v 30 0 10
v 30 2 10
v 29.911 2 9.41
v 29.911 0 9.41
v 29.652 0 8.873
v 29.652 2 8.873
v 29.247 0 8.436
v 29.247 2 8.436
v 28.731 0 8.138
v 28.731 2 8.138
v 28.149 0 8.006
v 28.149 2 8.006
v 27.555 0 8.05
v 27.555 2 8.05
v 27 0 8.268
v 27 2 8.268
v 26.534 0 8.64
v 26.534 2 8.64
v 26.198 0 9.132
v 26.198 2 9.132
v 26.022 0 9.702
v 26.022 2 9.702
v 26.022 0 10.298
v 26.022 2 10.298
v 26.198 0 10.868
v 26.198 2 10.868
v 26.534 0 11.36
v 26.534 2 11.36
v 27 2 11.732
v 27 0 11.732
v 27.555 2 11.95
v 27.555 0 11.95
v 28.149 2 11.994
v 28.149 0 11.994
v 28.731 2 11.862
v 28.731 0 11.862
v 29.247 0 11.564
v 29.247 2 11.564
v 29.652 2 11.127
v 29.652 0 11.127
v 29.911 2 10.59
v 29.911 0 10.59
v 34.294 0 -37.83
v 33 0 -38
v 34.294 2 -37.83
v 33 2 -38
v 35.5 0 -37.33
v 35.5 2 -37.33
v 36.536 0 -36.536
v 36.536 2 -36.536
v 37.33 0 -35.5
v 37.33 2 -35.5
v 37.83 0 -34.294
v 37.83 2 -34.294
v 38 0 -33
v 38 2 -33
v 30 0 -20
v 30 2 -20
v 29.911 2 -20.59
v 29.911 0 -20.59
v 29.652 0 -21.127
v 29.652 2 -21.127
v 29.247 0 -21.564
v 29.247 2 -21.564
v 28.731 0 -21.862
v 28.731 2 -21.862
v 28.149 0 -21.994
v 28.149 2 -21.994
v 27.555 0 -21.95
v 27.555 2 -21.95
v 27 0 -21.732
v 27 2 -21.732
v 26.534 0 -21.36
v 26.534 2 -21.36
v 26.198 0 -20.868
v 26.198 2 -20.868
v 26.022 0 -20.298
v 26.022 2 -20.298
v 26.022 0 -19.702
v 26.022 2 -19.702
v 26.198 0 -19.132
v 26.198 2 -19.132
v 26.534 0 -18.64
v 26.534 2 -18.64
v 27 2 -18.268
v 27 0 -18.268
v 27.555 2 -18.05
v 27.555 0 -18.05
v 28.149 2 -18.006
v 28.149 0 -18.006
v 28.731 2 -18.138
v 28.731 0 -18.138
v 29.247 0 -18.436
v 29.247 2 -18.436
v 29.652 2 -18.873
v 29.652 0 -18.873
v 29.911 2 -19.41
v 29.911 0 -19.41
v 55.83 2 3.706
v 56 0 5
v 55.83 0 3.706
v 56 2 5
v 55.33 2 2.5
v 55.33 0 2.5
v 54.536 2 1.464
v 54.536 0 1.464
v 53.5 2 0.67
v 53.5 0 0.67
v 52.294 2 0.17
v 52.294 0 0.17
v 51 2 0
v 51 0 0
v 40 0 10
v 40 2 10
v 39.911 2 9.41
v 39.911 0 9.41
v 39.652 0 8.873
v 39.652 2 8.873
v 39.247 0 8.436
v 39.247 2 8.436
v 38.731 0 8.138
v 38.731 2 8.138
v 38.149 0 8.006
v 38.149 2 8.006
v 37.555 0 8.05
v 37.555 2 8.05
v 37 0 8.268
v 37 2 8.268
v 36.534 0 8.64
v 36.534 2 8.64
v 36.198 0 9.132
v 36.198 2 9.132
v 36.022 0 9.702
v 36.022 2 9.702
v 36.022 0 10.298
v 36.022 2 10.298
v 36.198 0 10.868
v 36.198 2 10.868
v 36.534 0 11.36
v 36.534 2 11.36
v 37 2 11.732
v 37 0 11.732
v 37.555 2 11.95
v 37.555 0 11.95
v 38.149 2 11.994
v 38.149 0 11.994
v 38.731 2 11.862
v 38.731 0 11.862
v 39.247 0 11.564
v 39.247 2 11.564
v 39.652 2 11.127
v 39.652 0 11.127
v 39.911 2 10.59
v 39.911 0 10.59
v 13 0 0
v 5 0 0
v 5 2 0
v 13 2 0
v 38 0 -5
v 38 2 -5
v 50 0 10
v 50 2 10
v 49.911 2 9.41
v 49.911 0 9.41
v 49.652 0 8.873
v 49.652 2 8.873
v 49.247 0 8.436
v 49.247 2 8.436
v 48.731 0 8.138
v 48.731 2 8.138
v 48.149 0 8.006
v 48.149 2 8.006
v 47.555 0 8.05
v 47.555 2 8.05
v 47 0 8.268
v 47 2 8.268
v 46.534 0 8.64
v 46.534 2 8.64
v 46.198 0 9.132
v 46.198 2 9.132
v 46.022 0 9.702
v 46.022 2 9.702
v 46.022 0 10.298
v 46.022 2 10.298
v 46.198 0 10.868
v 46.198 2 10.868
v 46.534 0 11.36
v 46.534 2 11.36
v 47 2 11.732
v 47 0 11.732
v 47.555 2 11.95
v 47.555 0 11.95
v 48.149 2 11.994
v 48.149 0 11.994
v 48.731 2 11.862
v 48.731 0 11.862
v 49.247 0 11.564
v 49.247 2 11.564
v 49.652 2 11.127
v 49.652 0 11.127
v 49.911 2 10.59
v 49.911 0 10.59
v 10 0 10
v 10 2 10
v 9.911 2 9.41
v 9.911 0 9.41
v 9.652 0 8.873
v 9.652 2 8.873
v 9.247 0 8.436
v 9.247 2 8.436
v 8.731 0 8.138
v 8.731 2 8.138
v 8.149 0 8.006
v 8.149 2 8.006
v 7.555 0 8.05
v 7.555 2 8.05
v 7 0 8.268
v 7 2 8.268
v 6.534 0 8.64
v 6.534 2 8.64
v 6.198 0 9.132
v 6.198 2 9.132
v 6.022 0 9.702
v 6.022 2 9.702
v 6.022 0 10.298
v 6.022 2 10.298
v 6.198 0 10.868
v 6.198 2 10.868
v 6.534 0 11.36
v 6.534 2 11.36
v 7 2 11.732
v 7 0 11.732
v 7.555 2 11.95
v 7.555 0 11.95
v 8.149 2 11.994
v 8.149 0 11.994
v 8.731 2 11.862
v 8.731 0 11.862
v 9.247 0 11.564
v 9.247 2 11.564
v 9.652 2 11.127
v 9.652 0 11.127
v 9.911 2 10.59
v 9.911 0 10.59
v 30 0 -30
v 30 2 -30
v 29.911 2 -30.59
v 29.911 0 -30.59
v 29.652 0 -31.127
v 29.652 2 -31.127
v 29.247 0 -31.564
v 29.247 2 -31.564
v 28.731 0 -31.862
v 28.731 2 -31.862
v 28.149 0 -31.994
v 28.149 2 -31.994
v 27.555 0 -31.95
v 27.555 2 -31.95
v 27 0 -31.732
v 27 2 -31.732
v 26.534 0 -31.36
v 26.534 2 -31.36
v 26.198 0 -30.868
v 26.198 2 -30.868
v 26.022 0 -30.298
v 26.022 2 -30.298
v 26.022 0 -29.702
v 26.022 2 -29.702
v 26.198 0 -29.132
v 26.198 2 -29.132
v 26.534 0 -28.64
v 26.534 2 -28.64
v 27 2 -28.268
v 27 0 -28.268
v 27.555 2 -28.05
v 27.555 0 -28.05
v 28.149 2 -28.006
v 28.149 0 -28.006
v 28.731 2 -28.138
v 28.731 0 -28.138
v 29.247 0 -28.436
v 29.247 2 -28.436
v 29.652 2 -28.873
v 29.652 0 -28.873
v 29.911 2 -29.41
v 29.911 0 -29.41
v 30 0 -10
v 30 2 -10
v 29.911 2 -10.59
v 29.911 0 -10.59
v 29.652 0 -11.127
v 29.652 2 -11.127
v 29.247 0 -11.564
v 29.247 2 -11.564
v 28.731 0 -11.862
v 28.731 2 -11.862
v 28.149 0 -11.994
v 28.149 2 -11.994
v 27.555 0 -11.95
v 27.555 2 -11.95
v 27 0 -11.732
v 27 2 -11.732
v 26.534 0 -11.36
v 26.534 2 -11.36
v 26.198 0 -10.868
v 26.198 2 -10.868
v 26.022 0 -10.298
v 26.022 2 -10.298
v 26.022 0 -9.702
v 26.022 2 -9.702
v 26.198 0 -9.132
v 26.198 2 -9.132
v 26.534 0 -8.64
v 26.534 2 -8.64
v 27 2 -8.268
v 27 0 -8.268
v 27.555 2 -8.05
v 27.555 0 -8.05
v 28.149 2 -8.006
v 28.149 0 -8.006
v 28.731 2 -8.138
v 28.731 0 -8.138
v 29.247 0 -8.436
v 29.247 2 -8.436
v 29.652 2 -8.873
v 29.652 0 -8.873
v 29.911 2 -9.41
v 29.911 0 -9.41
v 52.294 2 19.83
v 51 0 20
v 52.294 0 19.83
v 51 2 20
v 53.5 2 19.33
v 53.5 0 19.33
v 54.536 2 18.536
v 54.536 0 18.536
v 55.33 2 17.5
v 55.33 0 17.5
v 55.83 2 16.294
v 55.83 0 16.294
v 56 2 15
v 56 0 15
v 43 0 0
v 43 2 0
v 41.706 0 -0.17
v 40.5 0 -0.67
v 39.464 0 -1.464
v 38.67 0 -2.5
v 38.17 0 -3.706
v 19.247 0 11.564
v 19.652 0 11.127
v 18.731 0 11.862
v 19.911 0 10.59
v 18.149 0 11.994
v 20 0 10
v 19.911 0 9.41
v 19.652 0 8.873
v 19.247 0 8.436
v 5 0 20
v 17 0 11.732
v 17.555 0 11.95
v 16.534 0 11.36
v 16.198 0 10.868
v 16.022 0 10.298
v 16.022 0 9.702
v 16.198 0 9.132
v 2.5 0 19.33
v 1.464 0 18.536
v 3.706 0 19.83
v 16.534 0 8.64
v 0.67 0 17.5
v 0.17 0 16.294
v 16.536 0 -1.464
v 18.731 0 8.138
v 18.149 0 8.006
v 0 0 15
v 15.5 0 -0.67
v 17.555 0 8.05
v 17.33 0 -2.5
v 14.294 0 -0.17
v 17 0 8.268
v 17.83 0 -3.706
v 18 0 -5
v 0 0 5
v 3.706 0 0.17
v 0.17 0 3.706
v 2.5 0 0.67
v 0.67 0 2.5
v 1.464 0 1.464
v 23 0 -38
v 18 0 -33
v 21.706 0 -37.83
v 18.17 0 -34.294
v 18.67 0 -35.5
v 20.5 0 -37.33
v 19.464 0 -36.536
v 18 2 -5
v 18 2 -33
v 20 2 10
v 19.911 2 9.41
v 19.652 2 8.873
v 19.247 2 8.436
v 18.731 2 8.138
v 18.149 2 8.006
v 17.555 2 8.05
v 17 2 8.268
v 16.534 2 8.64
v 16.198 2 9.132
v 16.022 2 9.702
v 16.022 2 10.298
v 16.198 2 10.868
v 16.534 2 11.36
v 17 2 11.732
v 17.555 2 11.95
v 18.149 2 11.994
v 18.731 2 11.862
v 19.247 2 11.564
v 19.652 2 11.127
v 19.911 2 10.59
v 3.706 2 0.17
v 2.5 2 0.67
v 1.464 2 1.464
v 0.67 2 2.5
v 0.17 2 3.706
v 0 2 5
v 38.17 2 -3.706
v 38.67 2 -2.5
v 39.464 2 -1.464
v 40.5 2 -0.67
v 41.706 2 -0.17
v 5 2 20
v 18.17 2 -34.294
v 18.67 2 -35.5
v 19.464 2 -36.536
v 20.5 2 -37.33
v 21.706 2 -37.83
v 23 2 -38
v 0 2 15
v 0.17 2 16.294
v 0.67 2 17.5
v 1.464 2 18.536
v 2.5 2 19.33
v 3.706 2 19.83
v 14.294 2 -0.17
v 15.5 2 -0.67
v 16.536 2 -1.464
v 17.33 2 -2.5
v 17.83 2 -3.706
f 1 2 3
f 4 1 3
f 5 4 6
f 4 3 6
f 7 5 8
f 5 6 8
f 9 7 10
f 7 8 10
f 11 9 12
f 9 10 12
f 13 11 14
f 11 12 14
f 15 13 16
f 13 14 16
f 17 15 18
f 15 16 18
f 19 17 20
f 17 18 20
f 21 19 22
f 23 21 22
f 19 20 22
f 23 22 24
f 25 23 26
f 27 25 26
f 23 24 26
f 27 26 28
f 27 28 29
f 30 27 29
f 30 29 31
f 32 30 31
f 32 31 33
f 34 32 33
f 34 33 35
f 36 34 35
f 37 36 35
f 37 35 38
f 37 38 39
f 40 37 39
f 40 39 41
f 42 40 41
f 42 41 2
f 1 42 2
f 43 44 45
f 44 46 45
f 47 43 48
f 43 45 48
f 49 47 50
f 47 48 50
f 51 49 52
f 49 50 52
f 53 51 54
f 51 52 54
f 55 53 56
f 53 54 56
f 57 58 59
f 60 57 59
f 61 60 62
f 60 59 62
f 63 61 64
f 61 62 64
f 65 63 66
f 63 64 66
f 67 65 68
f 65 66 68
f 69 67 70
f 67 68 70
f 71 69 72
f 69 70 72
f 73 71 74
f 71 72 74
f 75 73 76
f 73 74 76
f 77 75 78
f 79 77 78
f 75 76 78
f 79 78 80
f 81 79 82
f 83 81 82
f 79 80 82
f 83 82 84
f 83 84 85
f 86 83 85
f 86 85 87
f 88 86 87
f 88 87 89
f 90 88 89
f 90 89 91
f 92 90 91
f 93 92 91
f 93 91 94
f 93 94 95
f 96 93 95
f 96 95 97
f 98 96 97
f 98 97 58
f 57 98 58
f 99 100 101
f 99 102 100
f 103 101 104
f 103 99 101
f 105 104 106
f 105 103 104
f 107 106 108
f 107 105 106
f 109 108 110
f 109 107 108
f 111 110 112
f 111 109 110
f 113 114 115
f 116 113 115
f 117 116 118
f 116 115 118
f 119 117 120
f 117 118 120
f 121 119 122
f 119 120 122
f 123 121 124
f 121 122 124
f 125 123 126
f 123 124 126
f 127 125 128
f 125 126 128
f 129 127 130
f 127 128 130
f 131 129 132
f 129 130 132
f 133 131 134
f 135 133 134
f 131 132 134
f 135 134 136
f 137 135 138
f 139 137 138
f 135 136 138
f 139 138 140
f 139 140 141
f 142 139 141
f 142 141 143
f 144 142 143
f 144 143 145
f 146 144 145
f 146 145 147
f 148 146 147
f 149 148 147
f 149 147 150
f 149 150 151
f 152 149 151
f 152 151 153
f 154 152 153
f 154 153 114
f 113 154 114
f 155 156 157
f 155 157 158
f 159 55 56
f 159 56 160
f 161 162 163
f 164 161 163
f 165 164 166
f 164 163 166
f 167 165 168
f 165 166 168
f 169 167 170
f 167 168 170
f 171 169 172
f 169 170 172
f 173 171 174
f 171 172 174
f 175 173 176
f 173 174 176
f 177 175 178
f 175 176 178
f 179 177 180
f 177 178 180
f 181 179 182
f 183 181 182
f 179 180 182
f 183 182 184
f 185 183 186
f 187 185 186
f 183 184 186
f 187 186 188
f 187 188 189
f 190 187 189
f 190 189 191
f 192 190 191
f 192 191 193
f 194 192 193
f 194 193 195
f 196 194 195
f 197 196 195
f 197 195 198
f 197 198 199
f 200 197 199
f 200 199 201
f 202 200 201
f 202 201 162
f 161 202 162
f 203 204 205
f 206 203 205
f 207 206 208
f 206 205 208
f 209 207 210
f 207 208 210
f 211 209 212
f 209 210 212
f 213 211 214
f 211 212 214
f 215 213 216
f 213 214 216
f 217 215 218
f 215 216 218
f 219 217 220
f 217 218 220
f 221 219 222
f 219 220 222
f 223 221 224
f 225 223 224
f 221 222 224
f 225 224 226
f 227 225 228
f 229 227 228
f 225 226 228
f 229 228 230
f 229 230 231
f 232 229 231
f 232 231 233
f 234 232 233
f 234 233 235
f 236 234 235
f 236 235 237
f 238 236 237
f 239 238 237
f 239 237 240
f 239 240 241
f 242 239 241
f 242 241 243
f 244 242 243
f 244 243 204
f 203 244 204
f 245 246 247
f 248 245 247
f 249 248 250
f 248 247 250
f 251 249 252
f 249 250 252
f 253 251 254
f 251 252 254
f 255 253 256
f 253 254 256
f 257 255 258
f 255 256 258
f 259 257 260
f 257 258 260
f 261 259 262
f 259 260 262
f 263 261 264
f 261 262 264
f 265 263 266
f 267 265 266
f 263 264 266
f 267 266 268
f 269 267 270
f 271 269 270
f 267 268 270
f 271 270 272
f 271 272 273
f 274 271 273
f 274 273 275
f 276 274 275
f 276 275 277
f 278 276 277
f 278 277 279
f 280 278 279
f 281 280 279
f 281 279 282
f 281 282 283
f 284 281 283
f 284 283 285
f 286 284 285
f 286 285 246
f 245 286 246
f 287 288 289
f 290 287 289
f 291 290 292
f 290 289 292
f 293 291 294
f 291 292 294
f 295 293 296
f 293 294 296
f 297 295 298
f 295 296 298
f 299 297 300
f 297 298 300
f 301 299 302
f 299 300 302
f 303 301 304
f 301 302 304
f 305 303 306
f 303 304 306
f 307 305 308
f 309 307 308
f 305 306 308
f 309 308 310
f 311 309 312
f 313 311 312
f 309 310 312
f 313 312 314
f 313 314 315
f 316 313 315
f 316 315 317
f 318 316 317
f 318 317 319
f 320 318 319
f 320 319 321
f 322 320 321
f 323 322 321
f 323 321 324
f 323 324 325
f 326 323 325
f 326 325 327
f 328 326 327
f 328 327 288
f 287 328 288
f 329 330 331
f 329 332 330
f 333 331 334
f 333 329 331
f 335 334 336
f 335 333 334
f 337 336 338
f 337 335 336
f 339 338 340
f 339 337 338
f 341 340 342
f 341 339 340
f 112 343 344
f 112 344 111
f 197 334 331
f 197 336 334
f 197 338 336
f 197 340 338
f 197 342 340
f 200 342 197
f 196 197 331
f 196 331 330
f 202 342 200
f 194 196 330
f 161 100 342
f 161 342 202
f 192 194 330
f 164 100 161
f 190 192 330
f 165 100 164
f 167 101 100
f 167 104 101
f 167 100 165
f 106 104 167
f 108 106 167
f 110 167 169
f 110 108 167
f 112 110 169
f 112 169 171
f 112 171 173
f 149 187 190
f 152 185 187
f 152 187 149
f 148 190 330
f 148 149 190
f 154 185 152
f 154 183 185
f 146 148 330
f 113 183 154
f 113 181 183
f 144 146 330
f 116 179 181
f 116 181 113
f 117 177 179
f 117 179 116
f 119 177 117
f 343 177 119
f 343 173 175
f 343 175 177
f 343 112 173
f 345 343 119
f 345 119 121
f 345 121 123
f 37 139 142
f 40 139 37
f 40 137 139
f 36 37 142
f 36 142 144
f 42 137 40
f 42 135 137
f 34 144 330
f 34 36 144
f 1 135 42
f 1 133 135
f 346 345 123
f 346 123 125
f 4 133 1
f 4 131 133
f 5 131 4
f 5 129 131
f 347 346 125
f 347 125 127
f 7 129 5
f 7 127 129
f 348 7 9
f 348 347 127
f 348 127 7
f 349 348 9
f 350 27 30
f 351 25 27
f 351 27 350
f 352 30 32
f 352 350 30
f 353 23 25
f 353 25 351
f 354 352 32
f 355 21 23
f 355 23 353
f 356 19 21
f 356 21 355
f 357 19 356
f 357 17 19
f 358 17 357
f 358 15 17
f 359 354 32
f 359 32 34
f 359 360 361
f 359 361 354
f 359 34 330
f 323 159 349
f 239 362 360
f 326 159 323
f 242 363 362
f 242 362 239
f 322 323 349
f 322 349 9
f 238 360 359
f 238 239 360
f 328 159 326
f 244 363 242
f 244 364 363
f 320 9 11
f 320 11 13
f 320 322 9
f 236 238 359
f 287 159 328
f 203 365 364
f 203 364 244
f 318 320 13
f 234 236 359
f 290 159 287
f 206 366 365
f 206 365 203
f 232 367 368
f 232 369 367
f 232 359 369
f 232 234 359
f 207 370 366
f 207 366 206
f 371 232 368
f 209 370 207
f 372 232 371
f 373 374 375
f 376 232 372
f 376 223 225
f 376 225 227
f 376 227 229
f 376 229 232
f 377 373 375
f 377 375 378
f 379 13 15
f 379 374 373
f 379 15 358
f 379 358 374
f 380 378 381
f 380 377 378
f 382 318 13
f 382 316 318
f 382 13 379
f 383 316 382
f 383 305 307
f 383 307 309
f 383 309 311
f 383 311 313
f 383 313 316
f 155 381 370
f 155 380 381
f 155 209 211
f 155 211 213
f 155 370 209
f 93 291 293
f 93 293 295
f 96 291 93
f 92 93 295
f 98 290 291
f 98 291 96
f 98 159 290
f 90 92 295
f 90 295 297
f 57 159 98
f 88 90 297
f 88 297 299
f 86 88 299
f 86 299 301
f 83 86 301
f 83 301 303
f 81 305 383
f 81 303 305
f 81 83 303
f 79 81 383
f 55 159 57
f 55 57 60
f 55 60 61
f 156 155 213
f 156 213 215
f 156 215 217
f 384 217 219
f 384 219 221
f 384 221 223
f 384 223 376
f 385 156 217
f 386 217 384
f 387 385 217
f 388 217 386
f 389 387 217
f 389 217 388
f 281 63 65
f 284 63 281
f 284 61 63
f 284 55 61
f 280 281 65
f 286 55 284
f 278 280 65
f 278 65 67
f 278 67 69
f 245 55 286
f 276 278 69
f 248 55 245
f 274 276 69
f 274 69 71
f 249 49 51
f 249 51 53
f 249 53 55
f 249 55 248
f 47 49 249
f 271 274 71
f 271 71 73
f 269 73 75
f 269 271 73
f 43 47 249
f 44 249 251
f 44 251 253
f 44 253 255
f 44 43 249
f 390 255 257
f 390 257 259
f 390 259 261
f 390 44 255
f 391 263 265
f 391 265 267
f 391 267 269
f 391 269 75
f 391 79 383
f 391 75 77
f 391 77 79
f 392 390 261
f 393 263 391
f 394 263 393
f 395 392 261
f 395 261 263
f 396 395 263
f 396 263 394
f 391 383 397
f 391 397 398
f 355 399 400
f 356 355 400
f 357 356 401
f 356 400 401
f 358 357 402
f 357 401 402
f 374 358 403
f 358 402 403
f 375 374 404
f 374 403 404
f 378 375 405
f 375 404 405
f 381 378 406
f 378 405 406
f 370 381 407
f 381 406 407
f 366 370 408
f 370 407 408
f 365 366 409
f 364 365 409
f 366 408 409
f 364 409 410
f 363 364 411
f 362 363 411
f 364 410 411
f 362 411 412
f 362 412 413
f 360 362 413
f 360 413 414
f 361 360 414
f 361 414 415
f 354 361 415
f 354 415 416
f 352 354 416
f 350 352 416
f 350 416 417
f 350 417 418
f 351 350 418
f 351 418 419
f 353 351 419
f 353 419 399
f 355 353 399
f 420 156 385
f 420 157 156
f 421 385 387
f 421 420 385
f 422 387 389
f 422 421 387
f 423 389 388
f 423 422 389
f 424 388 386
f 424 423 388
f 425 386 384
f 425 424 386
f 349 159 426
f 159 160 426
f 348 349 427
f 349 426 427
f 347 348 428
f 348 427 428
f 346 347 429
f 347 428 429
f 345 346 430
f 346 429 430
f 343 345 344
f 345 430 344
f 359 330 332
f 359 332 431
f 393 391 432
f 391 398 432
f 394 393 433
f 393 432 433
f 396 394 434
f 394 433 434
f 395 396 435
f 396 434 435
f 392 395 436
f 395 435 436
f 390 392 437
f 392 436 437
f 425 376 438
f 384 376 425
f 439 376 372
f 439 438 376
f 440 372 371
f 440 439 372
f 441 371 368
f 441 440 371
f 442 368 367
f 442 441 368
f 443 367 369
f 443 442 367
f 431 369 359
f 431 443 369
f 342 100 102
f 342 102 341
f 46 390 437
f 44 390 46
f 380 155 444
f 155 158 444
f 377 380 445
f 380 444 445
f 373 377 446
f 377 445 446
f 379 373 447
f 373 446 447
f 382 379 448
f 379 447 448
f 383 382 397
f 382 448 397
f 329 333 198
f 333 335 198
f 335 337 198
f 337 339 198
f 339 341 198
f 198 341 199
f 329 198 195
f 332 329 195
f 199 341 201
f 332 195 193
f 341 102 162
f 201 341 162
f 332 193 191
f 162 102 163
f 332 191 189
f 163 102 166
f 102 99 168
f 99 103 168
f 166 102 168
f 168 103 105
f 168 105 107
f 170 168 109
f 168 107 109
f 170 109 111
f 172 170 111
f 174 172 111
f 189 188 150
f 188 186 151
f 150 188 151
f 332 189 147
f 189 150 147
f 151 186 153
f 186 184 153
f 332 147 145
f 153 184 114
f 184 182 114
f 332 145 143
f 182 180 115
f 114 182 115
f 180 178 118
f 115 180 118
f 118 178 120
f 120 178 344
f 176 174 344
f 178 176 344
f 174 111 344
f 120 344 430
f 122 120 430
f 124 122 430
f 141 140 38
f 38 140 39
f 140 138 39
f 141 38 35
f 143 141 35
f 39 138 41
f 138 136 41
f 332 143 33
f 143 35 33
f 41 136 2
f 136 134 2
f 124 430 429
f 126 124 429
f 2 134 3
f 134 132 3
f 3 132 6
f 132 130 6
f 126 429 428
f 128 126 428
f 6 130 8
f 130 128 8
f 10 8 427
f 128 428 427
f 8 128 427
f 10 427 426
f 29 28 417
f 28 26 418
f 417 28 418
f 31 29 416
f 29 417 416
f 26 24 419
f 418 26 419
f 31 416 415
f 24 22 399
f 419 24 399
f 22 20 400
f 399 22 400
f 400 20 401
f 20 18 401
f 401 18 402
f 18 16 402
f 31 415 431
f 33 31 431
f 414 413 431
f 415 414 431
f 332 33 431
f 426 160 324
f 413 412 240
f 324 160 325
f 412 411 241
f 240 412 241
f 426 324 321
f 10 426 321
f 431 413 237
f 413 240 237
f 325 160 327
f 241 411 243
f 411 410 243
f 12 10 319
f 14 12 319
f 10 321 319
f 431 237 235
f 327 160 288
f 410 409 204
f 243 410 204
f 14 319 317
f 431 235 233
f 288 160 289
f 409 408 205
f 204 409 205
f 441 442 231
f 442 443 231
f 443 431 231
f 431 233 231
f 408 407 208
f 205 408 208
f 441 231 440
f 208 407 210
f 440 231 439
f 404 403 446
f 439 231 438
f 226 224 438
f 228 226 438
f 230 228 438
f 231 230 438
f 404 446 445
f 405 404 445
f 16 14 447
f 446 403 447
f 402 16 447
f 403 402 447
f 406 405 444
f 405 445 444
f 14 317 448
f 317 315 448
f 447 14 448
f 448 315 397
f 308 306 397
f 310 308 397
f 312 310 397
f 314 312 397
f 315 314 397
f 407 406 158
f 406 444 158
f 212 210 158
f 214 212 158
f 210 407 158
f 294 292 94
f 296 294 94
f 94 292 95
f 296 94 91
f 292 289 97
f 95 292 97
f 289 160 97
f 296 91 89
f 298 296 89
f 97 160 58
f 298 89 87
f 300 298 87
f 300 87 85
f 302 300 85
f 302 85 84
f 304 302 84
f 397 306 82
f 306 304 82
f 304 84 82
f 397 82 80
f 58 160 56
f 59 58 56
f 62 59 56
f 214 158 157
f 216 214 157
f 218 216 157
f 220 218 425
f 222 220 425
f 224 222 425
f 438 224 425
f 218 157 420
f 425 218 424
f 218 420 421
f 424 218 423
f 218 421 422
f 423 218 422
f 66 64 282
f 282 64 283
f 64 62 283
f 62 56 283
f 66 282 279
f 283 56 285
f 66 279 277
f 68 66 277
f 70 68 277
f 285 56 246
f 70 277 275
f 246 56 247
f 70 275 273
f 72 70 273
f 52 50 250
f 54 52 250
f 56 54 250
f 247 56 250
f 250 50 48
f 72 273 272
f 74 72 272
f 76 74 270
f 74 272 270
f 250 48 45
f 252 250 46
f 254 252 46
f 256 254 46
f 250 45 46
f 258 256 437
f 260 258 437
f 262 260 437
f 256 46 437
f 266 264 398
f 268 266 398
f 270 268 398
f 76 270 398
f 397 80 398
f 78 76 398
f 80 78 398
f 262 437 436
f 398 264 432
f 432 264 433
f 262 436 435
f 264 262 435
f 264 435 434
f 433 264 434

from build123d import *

# Parameters (mm, degrees)
EXTRUDE_1_DEPTH       = 2
HOLE_WIZARD_4_0_4_1_D = 4
FILLET_1_R            = 5
FILLET_2_R            = 5
HOLE_WIZARD_4_0_4_2_D = 4


with BuildPart() as part:
    # 草圖1 → 填料-伸長1 (new body)
    with BuildSketch(Plane(origin=(0, 0, 0), x_dir=(1, 0, 0), z_dir=(0, 1, 0))):
        Polygon((0, 0), (18, 0), (18, 38), (38, 38), (38, 0), (56, 0), (56, -20), (0, -20), align=None)
    extrude(amount=EXTRUDE_1_DEPTH)

    # Ø4.0 (4) 直徑孔1 (through all)
    with Locations(Plane(origin=(0, 0, 0), x_dir=(-1, 0, 0), z_dir=(0, -1, 0))):
        with Locations((-28, 30), (-28, 10), (-28, -10), (-8, -10), (-48, -10)):
            Hole(HOLE_WIZARD_4_0_4_1_D / 2)

    # 圓角1
    fillet_1_edges = [part.edges().sort_by_distance(p)[0] for p in [
        (0, 1, 0),
        (18, 1, -38),
        (38, 1, -38),
        (56, 1, 0),
        (56, 1, 20),
        (0, 1, 20),
    ]]
    fillet(fillet_1_edges, radius=FILLET_1_R)

    # 圓角2
    fillet_2_edges = [part.edges().sort_by_distance(p)[0] for p in [
        (18, 1, 0),
        (38, 1, 0),
    ]]
    fillet(fillet_2_edges, radius=FILLET_2_R)

    # Ø4.0 (4) 直徑孔2 (through all)
    with Locations(Plane(origin=(0, 0, 0), x_dir=(-1, 0, 0), z_dir=(0, -1, 0))):
        with Locations((-38, -10), (-18, -10), (-28, 20)):
            Hole(HOLE_WIZARD_4_0_4_2_D / 2)


solid = part.part
